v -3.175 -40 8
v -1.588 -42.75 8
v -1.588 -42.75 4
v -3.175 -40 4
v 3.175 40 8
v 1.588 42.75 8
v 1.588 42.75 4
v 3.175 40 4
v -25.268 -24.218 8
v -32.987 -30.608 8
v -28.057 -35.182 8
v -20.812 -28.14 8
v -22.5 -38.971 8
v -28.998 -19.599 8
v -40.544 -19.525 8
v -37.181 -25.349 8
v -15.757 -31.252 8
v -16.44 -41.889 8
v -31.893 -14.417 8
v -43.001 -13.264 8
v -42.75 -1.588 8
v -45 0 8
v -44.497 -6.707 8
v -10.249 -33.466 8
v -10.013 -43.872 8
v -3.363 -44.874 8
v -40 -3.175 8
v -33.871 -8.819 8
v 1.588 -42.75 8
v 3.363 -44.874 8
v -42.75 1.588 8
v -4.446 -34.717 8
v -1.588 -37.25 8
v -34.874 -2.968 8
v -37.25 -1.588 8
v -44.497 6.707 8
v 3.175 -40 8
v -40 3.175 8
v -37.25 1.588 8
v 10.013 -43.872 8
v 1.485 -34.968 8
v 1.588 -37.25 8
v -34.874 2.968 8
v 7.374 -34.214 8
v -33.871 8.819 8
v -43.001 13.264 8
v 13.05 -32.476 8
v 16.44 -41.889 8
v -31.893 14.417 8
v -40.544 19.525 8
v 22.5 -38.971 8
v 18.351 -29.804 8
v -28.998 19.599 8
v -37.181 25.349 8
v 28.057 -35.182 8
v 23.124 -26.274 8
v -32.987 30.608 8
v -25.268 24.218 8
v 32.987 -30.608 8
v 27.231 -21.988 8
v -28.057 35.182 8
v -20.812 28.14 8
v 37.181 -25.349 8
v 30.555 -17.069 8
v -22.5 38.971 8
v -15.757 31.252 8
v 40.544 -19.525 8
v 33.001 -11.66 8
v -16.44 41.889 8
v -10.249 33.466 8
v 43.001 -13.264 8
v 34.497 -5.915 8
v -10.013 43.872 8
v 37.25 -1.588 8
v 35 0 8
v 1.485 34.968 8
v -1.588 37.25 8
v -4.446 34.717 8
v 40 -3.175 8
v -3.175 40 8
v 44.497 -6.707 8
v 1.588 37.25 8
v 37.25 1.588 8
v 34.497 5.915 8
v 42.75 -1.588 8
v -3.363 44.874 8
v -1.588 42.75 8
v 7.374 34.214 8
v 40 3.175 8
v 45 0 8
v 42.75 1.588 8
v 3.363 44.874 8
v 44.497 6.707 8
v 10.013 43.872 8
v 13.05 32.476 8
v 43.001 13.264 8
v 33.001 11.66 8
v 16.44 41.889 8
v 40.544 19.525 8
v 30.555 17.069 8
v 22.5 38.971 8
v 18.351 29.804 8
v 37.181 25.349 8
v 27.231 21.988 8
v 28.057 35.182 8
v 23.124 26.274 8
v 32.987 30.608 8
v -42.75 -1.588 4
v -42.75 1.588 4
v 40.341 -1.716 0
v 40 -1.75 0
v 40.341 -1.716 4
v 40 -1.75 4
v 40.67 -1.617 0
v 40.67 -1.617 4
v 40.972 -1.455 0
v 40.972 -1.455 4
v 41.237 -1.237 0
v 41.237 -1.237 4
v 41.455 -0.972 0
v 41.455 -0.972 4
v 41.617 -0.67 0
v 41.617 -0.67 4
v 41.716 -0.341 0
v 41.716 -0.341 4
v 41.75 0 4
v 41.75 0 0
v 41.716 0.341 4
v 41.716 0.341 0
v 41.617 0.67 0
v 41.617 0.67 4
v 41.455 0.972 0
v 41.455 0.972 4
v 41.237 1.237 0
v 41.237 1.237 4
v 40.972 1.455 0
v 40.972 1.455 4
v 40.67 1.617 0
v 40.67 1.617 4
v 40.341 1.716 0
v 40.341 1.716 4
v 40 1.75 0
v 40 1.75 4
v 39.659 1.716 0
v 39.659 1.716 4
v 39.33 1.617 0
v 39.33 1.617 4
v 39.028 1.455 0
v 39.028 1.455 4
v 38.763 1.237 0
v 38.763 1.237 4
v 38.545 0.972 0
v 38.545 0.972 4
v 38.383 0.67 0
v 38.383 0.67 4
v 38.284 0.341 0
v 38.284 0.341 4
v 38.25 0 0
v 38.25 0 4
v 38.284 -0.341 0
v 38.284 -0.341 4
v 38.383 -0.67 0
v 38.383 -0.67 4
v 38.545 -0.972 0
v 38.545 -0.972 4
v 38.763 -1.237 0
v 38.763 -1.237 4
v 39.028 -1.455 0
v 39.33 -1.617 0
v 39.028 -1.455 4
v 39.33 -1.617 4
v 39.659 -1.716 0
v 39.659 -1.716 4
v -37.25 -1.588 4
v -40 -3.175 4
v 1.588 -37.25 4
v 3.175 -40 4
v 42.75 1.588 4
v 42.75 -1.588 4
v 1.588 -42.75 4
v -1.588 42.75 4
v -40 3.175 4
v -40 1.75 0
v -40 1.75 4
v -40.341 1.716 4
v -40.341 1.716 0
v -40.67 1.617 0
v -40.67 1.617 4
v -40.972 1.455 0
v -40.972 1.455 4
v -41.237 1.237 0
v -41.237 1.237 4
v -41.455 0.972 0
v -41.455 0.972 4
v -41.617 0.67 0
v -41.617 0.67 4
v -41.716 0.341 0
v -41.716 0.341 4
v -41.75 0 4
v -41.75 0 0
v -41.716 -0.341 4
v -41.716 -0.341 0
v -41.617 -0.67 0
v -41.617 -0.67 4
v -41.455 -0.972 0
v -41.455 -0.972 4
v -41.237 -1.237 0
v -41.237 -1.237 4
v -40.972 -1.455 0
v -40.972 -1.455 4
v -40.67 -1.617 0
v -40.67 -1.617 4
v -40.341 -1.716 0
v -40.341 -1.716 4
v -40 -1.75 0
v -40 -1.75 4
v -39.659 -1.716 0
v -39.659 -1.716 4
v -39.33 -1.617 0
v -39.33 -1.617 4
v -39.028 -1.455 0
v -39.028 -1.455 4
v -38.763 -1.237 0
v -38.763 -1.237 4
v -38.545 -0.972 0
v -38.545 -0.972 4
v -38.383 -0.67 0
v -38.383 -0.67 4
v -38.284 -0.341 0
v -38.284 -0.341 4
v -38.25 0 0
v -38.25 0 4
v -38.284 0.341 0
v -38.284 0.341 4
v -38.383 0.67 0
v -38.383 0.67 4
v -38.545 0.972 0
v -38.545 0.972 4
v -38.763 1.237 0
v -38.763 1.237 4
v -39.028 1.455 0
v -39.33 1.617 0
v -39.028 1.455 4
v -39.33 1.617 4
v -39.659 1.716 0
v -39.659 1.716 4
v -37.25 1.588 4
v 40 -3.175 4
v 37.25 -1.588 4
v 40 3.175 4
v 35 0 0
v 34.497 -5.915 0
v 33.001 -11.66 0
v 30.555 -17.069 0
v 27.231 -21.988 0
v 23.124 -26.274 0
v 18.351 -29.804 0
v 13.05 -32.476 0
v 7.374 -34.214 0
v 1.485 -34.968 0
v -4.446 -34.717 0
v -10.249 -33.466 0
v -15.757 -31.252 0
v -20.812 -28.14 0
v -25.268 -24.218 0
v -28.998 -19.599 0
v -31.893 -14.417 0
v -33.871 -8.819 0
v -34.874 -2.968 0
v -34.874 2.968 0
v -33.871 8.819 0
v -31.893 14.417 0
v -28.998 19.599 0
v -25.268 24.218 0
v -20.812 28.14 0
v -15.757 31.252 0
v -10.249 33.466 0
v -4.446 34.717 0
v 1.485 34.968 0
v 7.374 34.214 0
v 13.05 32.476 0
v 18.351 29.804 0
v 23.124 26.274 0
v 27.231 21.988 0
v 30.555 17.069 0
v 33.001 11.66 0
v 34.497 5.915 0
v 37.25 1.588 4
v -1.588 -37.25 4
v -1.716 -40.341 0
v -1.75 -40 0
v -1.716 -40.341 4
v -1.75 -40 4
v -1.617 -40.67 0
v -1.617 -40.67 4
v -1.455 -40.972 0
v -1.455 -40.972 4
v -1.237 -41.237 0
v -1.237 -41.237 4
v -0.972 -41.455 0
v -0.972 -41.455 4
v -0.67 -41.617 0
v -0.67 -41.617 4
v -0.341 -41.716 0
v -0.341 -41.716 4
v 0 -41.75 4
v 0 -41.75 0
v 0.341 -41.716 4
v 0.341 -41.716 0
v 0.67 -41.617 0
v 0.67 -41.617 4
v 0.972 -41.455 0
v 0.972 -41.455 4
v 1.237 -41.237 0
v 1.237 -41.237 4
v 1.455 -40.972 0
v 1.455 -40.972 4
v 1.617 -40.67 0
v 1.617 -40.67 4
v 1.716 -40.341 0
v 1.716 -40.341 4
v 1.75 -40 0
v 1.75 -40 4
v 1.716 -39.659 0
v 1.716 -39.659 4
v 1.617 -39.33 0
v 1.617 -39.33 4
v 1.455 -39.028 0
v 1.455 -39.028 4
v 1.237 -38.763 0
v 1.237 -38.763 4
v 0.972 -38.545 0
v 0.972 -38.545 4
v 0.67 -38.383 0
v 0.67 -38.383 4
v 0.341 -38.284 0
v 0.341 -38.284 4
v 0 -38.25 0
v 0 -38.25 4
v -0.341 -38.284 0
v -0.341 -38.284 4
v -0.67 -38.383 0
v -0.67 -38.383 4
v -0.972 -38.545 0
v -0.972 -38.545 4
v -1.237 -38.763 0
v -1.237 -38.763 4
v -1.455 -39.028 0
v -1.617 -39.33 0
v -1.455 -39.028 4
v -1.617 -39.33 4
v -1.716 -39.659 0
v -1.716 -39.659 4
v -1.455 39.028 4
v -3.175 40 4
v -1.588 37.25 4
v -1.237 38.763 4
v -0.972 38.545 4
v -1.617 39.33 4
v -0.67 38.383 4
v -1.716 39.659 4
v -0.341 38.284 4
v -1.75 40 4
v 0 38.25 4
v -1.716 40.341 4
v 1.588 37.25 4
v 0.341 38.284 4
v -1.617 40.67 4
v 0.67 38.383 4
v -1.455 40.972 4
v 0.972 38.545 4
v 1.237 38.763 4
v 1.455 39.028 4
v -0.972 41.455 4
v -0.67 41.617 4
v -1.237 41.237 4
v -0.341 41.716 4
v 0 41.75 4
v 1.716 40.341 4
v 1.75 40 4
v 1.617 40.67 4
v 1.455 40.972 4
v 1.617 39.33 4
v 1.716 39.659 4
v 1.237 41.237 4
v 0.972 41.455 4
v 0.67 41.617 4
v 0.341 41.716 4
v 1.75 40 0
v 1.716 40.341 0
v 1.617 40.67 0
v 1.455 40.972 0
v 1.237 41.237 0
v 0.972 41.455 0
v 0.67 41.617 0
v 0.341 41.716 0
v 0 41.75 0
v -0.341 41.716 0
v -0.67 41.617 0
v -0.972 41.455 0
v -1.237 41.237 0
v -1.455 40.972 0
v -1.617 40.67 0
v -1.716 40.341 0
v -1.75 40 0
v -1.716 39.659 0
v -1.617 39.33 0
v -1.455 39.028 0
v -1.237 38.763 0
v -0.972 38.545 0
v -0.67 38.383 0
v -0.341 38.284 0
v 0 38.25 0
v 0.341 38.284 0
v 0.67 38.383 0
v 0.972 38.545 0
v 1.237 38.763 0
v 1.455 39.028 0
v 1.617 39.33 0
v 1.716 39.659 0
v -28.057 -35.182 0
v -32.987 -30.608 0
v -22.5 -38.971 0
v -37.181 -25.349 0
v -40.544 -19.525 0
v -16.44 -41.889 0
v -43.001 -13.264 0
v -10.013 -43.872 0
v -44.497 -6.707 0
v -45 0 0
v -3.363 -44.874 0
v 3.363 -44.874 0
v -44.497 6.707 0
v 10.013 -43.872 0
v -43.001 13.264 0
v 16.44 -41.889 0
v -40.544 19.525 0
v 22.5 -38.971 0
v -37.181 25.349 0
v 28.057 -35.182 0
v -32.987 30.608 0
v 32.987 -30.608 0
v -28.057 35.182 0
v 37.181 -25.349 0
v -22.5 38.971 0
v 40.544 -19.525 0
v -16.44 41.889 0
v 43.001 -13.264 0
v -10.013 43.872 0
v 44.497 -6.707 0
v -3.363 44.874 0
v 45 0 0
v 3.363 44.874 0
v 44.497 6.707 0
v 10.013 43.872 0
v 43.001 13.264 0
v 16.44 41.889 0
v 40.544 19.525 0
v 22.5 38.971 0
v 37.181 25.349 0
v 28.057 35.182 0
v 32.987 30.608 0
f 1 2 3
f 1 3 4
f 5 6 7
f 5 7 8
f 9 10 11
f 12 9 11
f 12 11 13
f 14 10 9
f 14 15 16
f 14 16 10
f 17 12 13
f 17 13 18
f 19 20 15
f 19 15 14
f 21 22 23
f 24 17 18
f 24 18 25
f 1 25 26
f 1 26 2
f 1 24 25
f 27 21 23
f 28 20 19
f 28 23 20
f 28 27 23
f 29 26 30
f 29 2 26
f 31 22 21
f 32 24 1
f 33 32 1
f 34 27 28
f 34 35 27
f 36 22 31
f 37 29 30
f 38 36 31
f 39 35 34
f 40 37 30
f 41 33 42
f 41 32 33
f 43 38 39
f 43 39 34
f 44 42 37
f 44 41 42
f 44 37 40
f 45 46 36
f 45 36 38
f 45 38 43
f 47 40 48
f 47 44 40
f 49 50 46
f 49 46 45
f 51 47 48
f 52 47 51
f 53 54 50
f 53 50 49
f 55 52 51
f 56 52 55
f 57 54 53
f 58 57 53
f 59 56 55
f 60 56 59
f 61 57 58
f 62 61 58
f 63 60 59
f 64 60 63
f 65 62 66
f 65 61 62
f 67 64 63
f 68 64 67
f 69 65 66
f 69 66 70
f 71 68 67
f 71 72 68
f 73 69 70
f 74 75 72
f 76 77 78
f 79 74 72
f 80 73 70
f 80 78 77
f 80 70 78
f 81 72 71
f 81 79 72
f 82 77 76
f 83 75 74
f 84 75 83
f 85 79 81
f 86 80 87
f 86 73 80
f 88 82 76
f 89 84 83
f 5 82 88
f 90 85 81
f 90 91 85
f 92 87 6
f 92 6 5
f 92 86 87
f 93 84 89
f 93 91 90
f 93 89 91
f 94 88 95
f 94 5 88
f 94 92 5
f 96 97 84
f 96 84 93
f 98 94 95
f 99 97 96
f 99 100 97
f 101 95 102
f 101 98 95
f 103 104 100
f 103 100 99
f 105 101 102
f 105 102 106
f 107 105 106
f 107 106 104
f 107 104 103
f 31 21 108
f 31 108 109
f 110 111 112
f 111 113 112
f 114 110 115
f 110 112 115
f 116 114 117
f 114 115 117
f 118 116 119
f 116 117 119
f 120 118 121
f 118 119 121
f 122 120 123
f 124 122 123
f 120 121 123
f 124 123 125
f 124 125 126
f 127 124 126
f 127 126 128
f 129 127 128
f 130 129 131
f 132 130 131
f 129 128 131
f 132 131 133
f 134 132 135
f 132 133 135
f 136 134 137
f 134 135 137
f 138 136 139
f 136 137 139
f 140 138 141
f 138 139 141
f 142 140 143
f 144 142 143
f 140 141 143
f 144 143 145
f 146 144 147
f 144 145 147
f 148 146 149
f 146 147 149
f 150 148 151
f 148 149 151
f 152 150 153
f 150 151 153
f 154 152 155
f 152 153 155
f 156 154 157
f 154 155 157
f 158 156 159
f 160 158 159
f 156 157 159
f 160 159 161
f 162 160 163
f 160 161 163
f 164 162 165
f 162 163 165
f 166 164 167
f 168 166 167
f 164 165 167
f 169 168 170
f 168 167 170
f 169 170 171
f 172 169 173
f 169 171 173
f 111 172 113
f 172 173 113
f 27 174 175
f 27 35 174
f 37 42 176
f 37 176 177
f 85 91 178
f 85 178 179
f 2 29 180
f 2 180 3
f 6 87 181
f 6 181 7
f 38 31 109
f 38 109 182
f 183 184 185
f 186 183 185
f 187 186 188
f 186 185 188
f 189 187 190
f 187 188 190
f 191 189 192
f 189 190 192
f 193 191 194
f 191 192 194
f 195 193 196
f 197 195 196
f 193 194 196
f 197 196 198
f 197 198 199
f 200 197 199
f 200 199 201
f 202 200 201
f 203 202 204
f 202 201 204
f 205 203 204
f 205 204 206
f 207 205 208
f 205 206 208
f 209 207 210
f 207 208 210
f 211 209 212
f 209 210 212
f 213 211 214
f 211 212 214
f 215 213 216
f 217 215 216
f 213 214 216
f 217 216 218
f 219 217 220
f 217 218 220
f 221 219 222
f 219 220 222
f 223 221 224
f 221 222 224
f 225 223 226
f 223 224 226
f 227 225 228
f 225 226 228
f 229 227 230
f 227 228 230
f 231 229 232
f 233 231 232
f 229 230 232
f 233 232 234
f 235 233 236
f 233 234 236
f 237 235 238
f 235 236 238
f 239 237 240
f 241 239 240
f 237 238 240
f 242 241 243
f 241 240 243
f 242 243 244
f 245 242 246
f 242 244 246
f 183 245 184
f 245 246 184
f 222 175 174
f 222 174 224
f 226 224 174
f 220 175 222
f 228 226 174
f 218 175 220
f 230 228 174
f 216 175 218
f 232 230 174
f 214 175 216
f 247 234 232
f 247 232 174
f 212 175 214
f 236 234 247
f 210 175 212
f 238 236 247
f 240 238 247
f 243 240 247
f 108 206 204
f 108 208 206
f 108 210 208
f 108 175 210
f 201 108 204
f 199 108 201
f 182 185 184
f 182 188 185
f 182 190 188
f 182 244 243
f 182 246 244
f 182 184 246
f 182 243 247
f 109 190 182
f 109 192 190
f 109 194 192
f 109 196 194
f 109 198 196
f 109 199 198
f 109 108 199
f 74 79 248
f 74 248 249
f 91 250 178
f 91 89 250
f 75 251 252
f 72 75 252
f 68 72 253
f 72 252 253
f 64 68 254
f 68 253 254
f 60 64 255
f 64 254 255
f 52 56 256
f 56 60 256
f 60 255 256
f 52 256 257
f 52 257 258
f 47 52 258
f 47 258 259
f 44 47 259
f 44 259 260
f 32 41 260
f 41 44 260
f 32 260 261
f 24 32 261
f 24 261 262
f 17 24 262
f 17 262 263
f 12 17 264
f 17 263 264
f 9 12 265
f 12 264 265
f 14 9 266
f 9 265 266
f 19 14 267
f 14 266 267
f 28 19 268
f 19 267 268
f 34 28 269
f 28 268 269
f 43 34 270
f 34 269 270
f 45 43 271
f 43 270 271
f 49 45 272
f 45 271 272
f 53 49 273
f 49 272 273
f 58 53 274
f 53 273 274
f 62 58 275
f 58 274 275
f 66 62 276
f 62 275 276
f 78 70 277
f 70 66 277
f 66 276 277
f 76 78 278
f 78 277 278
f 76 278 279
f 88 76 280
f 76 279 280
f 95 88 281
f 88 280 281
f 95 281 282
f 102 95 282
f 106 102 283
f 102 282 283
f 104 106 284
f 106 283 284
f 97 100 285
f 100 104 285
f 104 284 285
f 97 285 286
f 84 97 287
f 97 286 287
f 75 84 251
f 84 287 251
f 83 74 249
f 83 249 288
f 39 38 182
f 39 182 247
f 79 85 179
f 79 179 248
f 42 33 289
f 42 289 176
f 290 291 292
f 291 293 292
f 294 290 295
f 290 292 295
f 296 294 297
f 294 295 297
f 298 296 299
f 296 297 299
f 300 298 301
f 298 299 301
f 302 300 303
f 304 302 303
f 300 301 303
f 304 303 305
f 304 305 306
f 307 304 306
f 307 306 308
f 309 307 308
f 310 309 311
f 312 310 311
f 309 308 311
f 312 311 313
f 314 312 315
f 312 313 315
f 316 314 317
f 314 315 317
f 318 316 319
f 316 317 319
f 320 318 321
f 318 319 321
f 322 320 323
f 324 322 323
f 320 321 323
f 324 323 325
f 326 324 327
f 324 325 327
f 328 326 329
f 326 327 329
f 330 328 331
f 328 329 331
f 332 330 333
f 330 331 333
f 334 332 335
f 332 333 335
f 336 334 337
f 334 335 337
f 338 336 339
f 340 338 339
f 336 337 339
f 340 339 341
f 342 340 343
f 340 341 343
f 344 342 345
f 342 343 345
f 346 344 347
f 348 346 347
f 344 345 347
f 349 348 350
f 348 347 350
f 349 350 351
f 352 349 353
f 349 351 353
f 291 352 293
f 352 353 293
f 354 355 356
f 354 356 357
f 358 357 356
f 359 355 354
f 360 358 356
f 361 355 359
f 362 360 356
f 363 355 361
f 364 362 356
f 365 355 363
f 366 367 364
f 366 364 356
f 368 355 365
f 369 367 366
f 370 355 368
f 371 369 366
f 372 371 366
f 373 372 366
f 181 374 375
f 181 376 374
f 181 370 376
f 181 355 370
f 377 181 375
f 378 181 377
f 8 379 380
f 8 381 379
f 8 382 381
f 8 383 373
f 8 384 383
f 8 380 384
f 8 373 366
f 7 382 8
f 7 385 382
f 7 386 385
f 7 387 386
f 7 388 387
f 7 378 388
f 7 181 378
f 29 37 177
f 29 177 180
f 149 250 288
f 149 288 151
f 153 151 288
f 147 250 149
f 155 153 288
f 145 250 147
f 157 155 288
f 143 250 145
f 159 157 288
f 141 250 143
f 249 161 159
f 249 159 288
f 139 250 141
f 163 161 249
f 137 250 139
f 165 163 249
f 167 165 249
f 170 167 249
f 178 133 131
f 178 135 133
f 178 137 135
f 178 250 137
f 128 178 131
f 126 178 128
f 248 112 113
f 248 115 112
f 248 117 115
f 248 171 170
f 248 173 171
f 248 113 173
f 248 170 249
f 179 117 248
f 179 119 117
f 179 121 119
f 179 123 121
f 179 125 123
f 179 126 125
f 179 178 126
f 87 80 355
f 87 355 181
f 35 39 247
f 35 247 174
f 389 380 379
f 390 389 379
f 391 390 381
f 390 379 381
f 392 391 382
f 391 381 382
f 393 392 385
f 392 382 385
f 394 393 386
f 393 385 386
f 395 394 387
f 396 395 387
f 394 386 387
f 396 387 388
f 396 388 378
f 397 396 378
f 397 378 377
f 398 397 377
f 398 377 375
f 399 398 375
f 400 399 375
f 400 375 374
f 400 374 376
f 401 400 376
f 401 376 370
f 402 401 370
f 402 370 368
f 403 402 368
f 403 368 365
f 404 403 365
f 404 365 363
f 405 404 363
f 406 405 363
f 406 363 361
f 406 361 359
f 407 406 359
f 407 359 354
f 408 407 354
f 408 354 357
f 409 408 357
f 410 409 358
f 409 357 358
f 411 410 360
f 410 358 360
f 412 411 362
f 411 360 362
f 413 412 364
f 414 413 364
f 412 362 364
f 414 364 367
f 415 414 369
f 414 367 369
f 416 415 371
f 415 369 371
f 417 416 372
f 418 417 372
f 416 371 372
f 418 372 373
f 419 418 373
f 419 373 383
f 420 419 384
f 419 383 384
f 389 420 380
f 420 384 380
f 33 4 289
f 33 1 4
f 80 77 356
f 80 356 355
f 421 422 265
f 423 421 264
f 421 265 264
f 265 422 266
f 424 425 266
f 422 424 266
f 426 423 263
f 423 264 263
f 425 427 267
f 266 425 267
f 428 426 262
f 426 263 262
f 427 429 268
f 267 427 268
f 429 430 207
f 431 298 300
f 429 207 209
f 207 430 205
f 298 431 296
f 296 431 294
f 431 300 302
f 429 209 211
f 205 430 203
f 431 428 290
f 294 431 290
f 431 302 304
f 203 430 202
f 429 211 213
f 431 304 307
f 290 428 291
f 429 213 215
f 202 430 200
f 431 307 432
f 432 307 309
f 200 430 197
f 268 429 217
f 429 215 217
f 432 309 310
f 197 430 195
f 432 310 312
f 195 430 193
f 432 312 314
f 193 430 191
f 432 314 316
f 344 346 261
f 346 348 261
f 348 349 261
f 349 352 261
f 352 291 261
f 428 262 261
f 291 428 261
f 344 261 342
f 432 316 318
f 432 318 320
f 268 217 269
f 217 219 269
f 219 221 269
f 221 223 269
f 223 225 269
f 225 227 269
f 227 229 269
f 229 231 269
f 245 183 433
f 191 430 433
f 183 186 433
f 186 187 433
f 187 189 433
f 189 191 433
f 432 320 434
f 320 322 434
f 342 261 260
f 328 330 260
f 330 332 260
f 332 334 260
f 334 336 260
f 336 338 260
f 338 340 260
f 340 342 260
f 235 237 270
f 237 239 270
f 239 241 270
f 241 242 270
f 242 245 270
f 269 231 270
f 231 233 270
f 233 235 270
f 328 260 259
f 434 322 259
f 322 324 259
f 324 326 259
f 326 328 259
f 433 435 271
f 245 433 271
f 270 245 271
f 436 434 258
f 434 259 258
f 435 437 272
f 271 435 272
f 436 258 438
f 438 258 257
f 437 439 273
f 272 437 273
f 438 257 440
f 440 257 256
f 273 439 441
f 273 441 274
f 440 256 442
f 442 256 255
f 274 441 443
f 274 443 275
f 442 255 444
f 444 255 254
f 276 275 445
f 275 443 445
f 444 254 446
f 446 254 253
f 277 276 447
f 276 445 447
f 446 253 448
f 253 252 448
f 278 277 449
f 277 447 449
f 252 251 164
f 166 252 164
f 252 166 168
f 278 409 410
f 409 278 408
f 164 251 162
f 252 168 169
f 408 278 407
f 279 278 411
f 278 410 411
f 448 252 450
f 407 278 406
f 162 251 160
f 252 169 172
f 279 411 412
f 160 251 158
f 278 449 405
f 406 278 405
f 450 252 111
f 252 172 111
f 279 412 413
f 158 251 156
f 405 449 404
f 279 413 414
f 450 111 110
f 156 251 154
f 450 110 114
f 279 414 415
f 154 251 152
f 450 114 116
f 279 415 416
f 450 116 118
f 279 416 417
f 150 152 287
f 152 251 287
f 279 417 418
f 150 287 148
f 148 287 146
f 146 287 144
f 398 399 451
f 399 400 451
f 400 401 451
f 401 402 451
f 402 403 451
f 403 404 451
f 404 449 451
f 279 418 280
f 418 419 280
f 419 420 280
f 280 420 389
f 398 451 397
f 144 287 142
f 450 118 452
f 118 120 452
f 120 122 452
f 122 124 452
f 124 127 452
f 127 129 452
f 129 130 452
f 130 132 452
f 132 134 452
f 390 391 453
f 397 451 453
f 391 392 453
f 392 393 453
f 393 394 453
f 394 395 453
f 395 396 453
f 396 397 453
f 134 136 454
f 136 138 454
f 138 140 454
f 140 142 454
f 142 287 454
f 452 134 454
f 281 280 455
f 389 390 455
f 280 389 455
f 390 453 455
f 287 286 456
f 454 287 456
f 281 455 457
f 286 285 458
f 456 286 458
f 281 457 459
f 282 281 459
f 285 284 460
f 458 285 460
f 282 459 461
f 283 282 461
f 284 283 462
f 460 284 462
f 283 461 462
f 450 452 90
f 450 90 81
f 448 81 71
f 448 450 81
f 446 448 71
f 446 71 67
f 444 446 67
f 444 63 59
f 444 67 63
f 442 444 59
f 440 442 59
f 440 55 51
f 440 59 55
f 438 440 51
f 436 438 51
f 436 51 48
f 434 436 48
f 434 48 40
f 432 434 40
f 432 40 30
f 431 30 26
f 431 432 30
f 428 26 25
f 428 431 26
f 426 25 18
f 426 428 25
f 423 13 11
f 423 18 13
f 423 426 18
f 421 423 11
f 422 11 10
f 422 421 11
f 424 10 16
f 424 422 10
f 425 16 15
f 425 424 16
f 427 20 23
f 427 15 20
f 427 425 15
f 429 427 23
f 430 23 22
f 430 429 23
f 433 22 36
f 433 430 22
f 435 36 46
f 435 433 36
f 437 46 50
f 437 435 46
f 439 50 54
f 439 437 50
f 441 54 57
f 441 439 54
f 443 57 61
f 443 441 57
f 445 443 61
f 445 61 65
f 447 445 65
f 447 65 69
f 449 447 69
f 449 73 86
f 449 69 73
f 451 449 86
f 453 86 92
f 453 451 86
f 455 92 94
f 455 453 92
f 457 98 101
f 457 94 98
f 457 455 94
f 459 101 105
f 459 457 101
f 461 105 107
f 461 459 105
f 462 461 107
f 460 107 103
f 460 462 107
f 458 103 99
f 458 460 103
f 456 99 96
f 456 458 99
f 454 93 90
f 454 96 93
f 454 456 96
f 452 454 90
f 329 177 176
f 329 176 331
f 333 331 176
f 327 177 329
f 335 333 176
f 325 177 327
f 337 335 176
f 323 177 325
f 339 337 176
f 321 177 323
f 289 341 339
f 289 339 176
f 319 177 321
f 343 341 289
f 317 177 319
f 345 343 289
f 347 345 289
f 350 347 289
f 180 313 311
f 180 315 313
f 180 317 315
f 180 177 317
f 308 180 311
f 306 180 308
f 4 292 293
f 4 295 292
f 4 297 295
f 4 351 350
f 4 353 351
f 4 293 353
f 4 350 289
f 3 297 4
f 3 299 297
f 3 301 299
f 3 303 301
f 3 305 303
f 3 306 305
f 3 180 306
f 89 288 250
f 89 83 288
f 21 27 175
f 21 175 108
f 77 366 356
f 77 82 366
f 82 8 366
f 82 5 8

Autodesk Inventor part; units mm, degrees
ref_plane "YZ Plane" through (0, 0, 0) normal (1, 0, 0) x (0, 1, 0)
ref_plane "XZ Plane" through (0, 0, 0) normal (0, 1, 0) x (-1, 0, 0)
ref_plane "XY Plane" through (0, 0, 0) normal (0, 0, 1) x (1, 0, 0)
sketch "Sketch1" plane through (0, 0, 0) normal (0, 0, 1) x (1, 0, 0)
  circle A0 centre (0, 0) radius 45
  circle A1 centre (0, 0) radius 35
  dimension "d0" = 70
  dimension "d2" = 90
extrude "Extrusion1" add sketch "Sketch1" along normal blind 8
sketch "Sketch2" plane through (0, 0, 8) normal (0, 0, 1) x (1, 0, 0)
  circle A0 centre (0, 0) radius 35 projected
  circle A1 centre (0, 40) radius 1.75
  dimension "d5" = 40
  dimension "d6" = 3.5
extrude "Extrusion2" cut sketch "Sketch2" against normal through all contours A1
sketch "Sketch3" plane through (0, 0, 8) normal (0, 0, 1) x (1, 0, 0)
  circle A0 centre (0, 40) radius 1.75 projected
  line L0 (3.1754, 40) -> (1.5877, 37.25)
  line L1 (1.5877, 37.25) -> (-1.5877, 37.25)
  line L2 (-1.5877, 37.25) -> (-3.1754, 40)
  line L3 (-3.1754, 40) -> (-1.5877, 42.75)
  line L4 (-1.5877, 42.75) -> (1.5877, 42.75)
  line L5 (1.5877, 42.75) -> (3.1754, 40)
  point P0 (0, 42.75)
  dimension "d9" = 5.5
extrude "Extrusion3" cut sketch "Sketch3" against normal blind 4
pattern_circular "Circular Pattern1" count 4 over 360 about axis through (0, 0, 0) along (0, 0, 1) of "Extrusion3", "Extrusion2"
properties part number "ring"
